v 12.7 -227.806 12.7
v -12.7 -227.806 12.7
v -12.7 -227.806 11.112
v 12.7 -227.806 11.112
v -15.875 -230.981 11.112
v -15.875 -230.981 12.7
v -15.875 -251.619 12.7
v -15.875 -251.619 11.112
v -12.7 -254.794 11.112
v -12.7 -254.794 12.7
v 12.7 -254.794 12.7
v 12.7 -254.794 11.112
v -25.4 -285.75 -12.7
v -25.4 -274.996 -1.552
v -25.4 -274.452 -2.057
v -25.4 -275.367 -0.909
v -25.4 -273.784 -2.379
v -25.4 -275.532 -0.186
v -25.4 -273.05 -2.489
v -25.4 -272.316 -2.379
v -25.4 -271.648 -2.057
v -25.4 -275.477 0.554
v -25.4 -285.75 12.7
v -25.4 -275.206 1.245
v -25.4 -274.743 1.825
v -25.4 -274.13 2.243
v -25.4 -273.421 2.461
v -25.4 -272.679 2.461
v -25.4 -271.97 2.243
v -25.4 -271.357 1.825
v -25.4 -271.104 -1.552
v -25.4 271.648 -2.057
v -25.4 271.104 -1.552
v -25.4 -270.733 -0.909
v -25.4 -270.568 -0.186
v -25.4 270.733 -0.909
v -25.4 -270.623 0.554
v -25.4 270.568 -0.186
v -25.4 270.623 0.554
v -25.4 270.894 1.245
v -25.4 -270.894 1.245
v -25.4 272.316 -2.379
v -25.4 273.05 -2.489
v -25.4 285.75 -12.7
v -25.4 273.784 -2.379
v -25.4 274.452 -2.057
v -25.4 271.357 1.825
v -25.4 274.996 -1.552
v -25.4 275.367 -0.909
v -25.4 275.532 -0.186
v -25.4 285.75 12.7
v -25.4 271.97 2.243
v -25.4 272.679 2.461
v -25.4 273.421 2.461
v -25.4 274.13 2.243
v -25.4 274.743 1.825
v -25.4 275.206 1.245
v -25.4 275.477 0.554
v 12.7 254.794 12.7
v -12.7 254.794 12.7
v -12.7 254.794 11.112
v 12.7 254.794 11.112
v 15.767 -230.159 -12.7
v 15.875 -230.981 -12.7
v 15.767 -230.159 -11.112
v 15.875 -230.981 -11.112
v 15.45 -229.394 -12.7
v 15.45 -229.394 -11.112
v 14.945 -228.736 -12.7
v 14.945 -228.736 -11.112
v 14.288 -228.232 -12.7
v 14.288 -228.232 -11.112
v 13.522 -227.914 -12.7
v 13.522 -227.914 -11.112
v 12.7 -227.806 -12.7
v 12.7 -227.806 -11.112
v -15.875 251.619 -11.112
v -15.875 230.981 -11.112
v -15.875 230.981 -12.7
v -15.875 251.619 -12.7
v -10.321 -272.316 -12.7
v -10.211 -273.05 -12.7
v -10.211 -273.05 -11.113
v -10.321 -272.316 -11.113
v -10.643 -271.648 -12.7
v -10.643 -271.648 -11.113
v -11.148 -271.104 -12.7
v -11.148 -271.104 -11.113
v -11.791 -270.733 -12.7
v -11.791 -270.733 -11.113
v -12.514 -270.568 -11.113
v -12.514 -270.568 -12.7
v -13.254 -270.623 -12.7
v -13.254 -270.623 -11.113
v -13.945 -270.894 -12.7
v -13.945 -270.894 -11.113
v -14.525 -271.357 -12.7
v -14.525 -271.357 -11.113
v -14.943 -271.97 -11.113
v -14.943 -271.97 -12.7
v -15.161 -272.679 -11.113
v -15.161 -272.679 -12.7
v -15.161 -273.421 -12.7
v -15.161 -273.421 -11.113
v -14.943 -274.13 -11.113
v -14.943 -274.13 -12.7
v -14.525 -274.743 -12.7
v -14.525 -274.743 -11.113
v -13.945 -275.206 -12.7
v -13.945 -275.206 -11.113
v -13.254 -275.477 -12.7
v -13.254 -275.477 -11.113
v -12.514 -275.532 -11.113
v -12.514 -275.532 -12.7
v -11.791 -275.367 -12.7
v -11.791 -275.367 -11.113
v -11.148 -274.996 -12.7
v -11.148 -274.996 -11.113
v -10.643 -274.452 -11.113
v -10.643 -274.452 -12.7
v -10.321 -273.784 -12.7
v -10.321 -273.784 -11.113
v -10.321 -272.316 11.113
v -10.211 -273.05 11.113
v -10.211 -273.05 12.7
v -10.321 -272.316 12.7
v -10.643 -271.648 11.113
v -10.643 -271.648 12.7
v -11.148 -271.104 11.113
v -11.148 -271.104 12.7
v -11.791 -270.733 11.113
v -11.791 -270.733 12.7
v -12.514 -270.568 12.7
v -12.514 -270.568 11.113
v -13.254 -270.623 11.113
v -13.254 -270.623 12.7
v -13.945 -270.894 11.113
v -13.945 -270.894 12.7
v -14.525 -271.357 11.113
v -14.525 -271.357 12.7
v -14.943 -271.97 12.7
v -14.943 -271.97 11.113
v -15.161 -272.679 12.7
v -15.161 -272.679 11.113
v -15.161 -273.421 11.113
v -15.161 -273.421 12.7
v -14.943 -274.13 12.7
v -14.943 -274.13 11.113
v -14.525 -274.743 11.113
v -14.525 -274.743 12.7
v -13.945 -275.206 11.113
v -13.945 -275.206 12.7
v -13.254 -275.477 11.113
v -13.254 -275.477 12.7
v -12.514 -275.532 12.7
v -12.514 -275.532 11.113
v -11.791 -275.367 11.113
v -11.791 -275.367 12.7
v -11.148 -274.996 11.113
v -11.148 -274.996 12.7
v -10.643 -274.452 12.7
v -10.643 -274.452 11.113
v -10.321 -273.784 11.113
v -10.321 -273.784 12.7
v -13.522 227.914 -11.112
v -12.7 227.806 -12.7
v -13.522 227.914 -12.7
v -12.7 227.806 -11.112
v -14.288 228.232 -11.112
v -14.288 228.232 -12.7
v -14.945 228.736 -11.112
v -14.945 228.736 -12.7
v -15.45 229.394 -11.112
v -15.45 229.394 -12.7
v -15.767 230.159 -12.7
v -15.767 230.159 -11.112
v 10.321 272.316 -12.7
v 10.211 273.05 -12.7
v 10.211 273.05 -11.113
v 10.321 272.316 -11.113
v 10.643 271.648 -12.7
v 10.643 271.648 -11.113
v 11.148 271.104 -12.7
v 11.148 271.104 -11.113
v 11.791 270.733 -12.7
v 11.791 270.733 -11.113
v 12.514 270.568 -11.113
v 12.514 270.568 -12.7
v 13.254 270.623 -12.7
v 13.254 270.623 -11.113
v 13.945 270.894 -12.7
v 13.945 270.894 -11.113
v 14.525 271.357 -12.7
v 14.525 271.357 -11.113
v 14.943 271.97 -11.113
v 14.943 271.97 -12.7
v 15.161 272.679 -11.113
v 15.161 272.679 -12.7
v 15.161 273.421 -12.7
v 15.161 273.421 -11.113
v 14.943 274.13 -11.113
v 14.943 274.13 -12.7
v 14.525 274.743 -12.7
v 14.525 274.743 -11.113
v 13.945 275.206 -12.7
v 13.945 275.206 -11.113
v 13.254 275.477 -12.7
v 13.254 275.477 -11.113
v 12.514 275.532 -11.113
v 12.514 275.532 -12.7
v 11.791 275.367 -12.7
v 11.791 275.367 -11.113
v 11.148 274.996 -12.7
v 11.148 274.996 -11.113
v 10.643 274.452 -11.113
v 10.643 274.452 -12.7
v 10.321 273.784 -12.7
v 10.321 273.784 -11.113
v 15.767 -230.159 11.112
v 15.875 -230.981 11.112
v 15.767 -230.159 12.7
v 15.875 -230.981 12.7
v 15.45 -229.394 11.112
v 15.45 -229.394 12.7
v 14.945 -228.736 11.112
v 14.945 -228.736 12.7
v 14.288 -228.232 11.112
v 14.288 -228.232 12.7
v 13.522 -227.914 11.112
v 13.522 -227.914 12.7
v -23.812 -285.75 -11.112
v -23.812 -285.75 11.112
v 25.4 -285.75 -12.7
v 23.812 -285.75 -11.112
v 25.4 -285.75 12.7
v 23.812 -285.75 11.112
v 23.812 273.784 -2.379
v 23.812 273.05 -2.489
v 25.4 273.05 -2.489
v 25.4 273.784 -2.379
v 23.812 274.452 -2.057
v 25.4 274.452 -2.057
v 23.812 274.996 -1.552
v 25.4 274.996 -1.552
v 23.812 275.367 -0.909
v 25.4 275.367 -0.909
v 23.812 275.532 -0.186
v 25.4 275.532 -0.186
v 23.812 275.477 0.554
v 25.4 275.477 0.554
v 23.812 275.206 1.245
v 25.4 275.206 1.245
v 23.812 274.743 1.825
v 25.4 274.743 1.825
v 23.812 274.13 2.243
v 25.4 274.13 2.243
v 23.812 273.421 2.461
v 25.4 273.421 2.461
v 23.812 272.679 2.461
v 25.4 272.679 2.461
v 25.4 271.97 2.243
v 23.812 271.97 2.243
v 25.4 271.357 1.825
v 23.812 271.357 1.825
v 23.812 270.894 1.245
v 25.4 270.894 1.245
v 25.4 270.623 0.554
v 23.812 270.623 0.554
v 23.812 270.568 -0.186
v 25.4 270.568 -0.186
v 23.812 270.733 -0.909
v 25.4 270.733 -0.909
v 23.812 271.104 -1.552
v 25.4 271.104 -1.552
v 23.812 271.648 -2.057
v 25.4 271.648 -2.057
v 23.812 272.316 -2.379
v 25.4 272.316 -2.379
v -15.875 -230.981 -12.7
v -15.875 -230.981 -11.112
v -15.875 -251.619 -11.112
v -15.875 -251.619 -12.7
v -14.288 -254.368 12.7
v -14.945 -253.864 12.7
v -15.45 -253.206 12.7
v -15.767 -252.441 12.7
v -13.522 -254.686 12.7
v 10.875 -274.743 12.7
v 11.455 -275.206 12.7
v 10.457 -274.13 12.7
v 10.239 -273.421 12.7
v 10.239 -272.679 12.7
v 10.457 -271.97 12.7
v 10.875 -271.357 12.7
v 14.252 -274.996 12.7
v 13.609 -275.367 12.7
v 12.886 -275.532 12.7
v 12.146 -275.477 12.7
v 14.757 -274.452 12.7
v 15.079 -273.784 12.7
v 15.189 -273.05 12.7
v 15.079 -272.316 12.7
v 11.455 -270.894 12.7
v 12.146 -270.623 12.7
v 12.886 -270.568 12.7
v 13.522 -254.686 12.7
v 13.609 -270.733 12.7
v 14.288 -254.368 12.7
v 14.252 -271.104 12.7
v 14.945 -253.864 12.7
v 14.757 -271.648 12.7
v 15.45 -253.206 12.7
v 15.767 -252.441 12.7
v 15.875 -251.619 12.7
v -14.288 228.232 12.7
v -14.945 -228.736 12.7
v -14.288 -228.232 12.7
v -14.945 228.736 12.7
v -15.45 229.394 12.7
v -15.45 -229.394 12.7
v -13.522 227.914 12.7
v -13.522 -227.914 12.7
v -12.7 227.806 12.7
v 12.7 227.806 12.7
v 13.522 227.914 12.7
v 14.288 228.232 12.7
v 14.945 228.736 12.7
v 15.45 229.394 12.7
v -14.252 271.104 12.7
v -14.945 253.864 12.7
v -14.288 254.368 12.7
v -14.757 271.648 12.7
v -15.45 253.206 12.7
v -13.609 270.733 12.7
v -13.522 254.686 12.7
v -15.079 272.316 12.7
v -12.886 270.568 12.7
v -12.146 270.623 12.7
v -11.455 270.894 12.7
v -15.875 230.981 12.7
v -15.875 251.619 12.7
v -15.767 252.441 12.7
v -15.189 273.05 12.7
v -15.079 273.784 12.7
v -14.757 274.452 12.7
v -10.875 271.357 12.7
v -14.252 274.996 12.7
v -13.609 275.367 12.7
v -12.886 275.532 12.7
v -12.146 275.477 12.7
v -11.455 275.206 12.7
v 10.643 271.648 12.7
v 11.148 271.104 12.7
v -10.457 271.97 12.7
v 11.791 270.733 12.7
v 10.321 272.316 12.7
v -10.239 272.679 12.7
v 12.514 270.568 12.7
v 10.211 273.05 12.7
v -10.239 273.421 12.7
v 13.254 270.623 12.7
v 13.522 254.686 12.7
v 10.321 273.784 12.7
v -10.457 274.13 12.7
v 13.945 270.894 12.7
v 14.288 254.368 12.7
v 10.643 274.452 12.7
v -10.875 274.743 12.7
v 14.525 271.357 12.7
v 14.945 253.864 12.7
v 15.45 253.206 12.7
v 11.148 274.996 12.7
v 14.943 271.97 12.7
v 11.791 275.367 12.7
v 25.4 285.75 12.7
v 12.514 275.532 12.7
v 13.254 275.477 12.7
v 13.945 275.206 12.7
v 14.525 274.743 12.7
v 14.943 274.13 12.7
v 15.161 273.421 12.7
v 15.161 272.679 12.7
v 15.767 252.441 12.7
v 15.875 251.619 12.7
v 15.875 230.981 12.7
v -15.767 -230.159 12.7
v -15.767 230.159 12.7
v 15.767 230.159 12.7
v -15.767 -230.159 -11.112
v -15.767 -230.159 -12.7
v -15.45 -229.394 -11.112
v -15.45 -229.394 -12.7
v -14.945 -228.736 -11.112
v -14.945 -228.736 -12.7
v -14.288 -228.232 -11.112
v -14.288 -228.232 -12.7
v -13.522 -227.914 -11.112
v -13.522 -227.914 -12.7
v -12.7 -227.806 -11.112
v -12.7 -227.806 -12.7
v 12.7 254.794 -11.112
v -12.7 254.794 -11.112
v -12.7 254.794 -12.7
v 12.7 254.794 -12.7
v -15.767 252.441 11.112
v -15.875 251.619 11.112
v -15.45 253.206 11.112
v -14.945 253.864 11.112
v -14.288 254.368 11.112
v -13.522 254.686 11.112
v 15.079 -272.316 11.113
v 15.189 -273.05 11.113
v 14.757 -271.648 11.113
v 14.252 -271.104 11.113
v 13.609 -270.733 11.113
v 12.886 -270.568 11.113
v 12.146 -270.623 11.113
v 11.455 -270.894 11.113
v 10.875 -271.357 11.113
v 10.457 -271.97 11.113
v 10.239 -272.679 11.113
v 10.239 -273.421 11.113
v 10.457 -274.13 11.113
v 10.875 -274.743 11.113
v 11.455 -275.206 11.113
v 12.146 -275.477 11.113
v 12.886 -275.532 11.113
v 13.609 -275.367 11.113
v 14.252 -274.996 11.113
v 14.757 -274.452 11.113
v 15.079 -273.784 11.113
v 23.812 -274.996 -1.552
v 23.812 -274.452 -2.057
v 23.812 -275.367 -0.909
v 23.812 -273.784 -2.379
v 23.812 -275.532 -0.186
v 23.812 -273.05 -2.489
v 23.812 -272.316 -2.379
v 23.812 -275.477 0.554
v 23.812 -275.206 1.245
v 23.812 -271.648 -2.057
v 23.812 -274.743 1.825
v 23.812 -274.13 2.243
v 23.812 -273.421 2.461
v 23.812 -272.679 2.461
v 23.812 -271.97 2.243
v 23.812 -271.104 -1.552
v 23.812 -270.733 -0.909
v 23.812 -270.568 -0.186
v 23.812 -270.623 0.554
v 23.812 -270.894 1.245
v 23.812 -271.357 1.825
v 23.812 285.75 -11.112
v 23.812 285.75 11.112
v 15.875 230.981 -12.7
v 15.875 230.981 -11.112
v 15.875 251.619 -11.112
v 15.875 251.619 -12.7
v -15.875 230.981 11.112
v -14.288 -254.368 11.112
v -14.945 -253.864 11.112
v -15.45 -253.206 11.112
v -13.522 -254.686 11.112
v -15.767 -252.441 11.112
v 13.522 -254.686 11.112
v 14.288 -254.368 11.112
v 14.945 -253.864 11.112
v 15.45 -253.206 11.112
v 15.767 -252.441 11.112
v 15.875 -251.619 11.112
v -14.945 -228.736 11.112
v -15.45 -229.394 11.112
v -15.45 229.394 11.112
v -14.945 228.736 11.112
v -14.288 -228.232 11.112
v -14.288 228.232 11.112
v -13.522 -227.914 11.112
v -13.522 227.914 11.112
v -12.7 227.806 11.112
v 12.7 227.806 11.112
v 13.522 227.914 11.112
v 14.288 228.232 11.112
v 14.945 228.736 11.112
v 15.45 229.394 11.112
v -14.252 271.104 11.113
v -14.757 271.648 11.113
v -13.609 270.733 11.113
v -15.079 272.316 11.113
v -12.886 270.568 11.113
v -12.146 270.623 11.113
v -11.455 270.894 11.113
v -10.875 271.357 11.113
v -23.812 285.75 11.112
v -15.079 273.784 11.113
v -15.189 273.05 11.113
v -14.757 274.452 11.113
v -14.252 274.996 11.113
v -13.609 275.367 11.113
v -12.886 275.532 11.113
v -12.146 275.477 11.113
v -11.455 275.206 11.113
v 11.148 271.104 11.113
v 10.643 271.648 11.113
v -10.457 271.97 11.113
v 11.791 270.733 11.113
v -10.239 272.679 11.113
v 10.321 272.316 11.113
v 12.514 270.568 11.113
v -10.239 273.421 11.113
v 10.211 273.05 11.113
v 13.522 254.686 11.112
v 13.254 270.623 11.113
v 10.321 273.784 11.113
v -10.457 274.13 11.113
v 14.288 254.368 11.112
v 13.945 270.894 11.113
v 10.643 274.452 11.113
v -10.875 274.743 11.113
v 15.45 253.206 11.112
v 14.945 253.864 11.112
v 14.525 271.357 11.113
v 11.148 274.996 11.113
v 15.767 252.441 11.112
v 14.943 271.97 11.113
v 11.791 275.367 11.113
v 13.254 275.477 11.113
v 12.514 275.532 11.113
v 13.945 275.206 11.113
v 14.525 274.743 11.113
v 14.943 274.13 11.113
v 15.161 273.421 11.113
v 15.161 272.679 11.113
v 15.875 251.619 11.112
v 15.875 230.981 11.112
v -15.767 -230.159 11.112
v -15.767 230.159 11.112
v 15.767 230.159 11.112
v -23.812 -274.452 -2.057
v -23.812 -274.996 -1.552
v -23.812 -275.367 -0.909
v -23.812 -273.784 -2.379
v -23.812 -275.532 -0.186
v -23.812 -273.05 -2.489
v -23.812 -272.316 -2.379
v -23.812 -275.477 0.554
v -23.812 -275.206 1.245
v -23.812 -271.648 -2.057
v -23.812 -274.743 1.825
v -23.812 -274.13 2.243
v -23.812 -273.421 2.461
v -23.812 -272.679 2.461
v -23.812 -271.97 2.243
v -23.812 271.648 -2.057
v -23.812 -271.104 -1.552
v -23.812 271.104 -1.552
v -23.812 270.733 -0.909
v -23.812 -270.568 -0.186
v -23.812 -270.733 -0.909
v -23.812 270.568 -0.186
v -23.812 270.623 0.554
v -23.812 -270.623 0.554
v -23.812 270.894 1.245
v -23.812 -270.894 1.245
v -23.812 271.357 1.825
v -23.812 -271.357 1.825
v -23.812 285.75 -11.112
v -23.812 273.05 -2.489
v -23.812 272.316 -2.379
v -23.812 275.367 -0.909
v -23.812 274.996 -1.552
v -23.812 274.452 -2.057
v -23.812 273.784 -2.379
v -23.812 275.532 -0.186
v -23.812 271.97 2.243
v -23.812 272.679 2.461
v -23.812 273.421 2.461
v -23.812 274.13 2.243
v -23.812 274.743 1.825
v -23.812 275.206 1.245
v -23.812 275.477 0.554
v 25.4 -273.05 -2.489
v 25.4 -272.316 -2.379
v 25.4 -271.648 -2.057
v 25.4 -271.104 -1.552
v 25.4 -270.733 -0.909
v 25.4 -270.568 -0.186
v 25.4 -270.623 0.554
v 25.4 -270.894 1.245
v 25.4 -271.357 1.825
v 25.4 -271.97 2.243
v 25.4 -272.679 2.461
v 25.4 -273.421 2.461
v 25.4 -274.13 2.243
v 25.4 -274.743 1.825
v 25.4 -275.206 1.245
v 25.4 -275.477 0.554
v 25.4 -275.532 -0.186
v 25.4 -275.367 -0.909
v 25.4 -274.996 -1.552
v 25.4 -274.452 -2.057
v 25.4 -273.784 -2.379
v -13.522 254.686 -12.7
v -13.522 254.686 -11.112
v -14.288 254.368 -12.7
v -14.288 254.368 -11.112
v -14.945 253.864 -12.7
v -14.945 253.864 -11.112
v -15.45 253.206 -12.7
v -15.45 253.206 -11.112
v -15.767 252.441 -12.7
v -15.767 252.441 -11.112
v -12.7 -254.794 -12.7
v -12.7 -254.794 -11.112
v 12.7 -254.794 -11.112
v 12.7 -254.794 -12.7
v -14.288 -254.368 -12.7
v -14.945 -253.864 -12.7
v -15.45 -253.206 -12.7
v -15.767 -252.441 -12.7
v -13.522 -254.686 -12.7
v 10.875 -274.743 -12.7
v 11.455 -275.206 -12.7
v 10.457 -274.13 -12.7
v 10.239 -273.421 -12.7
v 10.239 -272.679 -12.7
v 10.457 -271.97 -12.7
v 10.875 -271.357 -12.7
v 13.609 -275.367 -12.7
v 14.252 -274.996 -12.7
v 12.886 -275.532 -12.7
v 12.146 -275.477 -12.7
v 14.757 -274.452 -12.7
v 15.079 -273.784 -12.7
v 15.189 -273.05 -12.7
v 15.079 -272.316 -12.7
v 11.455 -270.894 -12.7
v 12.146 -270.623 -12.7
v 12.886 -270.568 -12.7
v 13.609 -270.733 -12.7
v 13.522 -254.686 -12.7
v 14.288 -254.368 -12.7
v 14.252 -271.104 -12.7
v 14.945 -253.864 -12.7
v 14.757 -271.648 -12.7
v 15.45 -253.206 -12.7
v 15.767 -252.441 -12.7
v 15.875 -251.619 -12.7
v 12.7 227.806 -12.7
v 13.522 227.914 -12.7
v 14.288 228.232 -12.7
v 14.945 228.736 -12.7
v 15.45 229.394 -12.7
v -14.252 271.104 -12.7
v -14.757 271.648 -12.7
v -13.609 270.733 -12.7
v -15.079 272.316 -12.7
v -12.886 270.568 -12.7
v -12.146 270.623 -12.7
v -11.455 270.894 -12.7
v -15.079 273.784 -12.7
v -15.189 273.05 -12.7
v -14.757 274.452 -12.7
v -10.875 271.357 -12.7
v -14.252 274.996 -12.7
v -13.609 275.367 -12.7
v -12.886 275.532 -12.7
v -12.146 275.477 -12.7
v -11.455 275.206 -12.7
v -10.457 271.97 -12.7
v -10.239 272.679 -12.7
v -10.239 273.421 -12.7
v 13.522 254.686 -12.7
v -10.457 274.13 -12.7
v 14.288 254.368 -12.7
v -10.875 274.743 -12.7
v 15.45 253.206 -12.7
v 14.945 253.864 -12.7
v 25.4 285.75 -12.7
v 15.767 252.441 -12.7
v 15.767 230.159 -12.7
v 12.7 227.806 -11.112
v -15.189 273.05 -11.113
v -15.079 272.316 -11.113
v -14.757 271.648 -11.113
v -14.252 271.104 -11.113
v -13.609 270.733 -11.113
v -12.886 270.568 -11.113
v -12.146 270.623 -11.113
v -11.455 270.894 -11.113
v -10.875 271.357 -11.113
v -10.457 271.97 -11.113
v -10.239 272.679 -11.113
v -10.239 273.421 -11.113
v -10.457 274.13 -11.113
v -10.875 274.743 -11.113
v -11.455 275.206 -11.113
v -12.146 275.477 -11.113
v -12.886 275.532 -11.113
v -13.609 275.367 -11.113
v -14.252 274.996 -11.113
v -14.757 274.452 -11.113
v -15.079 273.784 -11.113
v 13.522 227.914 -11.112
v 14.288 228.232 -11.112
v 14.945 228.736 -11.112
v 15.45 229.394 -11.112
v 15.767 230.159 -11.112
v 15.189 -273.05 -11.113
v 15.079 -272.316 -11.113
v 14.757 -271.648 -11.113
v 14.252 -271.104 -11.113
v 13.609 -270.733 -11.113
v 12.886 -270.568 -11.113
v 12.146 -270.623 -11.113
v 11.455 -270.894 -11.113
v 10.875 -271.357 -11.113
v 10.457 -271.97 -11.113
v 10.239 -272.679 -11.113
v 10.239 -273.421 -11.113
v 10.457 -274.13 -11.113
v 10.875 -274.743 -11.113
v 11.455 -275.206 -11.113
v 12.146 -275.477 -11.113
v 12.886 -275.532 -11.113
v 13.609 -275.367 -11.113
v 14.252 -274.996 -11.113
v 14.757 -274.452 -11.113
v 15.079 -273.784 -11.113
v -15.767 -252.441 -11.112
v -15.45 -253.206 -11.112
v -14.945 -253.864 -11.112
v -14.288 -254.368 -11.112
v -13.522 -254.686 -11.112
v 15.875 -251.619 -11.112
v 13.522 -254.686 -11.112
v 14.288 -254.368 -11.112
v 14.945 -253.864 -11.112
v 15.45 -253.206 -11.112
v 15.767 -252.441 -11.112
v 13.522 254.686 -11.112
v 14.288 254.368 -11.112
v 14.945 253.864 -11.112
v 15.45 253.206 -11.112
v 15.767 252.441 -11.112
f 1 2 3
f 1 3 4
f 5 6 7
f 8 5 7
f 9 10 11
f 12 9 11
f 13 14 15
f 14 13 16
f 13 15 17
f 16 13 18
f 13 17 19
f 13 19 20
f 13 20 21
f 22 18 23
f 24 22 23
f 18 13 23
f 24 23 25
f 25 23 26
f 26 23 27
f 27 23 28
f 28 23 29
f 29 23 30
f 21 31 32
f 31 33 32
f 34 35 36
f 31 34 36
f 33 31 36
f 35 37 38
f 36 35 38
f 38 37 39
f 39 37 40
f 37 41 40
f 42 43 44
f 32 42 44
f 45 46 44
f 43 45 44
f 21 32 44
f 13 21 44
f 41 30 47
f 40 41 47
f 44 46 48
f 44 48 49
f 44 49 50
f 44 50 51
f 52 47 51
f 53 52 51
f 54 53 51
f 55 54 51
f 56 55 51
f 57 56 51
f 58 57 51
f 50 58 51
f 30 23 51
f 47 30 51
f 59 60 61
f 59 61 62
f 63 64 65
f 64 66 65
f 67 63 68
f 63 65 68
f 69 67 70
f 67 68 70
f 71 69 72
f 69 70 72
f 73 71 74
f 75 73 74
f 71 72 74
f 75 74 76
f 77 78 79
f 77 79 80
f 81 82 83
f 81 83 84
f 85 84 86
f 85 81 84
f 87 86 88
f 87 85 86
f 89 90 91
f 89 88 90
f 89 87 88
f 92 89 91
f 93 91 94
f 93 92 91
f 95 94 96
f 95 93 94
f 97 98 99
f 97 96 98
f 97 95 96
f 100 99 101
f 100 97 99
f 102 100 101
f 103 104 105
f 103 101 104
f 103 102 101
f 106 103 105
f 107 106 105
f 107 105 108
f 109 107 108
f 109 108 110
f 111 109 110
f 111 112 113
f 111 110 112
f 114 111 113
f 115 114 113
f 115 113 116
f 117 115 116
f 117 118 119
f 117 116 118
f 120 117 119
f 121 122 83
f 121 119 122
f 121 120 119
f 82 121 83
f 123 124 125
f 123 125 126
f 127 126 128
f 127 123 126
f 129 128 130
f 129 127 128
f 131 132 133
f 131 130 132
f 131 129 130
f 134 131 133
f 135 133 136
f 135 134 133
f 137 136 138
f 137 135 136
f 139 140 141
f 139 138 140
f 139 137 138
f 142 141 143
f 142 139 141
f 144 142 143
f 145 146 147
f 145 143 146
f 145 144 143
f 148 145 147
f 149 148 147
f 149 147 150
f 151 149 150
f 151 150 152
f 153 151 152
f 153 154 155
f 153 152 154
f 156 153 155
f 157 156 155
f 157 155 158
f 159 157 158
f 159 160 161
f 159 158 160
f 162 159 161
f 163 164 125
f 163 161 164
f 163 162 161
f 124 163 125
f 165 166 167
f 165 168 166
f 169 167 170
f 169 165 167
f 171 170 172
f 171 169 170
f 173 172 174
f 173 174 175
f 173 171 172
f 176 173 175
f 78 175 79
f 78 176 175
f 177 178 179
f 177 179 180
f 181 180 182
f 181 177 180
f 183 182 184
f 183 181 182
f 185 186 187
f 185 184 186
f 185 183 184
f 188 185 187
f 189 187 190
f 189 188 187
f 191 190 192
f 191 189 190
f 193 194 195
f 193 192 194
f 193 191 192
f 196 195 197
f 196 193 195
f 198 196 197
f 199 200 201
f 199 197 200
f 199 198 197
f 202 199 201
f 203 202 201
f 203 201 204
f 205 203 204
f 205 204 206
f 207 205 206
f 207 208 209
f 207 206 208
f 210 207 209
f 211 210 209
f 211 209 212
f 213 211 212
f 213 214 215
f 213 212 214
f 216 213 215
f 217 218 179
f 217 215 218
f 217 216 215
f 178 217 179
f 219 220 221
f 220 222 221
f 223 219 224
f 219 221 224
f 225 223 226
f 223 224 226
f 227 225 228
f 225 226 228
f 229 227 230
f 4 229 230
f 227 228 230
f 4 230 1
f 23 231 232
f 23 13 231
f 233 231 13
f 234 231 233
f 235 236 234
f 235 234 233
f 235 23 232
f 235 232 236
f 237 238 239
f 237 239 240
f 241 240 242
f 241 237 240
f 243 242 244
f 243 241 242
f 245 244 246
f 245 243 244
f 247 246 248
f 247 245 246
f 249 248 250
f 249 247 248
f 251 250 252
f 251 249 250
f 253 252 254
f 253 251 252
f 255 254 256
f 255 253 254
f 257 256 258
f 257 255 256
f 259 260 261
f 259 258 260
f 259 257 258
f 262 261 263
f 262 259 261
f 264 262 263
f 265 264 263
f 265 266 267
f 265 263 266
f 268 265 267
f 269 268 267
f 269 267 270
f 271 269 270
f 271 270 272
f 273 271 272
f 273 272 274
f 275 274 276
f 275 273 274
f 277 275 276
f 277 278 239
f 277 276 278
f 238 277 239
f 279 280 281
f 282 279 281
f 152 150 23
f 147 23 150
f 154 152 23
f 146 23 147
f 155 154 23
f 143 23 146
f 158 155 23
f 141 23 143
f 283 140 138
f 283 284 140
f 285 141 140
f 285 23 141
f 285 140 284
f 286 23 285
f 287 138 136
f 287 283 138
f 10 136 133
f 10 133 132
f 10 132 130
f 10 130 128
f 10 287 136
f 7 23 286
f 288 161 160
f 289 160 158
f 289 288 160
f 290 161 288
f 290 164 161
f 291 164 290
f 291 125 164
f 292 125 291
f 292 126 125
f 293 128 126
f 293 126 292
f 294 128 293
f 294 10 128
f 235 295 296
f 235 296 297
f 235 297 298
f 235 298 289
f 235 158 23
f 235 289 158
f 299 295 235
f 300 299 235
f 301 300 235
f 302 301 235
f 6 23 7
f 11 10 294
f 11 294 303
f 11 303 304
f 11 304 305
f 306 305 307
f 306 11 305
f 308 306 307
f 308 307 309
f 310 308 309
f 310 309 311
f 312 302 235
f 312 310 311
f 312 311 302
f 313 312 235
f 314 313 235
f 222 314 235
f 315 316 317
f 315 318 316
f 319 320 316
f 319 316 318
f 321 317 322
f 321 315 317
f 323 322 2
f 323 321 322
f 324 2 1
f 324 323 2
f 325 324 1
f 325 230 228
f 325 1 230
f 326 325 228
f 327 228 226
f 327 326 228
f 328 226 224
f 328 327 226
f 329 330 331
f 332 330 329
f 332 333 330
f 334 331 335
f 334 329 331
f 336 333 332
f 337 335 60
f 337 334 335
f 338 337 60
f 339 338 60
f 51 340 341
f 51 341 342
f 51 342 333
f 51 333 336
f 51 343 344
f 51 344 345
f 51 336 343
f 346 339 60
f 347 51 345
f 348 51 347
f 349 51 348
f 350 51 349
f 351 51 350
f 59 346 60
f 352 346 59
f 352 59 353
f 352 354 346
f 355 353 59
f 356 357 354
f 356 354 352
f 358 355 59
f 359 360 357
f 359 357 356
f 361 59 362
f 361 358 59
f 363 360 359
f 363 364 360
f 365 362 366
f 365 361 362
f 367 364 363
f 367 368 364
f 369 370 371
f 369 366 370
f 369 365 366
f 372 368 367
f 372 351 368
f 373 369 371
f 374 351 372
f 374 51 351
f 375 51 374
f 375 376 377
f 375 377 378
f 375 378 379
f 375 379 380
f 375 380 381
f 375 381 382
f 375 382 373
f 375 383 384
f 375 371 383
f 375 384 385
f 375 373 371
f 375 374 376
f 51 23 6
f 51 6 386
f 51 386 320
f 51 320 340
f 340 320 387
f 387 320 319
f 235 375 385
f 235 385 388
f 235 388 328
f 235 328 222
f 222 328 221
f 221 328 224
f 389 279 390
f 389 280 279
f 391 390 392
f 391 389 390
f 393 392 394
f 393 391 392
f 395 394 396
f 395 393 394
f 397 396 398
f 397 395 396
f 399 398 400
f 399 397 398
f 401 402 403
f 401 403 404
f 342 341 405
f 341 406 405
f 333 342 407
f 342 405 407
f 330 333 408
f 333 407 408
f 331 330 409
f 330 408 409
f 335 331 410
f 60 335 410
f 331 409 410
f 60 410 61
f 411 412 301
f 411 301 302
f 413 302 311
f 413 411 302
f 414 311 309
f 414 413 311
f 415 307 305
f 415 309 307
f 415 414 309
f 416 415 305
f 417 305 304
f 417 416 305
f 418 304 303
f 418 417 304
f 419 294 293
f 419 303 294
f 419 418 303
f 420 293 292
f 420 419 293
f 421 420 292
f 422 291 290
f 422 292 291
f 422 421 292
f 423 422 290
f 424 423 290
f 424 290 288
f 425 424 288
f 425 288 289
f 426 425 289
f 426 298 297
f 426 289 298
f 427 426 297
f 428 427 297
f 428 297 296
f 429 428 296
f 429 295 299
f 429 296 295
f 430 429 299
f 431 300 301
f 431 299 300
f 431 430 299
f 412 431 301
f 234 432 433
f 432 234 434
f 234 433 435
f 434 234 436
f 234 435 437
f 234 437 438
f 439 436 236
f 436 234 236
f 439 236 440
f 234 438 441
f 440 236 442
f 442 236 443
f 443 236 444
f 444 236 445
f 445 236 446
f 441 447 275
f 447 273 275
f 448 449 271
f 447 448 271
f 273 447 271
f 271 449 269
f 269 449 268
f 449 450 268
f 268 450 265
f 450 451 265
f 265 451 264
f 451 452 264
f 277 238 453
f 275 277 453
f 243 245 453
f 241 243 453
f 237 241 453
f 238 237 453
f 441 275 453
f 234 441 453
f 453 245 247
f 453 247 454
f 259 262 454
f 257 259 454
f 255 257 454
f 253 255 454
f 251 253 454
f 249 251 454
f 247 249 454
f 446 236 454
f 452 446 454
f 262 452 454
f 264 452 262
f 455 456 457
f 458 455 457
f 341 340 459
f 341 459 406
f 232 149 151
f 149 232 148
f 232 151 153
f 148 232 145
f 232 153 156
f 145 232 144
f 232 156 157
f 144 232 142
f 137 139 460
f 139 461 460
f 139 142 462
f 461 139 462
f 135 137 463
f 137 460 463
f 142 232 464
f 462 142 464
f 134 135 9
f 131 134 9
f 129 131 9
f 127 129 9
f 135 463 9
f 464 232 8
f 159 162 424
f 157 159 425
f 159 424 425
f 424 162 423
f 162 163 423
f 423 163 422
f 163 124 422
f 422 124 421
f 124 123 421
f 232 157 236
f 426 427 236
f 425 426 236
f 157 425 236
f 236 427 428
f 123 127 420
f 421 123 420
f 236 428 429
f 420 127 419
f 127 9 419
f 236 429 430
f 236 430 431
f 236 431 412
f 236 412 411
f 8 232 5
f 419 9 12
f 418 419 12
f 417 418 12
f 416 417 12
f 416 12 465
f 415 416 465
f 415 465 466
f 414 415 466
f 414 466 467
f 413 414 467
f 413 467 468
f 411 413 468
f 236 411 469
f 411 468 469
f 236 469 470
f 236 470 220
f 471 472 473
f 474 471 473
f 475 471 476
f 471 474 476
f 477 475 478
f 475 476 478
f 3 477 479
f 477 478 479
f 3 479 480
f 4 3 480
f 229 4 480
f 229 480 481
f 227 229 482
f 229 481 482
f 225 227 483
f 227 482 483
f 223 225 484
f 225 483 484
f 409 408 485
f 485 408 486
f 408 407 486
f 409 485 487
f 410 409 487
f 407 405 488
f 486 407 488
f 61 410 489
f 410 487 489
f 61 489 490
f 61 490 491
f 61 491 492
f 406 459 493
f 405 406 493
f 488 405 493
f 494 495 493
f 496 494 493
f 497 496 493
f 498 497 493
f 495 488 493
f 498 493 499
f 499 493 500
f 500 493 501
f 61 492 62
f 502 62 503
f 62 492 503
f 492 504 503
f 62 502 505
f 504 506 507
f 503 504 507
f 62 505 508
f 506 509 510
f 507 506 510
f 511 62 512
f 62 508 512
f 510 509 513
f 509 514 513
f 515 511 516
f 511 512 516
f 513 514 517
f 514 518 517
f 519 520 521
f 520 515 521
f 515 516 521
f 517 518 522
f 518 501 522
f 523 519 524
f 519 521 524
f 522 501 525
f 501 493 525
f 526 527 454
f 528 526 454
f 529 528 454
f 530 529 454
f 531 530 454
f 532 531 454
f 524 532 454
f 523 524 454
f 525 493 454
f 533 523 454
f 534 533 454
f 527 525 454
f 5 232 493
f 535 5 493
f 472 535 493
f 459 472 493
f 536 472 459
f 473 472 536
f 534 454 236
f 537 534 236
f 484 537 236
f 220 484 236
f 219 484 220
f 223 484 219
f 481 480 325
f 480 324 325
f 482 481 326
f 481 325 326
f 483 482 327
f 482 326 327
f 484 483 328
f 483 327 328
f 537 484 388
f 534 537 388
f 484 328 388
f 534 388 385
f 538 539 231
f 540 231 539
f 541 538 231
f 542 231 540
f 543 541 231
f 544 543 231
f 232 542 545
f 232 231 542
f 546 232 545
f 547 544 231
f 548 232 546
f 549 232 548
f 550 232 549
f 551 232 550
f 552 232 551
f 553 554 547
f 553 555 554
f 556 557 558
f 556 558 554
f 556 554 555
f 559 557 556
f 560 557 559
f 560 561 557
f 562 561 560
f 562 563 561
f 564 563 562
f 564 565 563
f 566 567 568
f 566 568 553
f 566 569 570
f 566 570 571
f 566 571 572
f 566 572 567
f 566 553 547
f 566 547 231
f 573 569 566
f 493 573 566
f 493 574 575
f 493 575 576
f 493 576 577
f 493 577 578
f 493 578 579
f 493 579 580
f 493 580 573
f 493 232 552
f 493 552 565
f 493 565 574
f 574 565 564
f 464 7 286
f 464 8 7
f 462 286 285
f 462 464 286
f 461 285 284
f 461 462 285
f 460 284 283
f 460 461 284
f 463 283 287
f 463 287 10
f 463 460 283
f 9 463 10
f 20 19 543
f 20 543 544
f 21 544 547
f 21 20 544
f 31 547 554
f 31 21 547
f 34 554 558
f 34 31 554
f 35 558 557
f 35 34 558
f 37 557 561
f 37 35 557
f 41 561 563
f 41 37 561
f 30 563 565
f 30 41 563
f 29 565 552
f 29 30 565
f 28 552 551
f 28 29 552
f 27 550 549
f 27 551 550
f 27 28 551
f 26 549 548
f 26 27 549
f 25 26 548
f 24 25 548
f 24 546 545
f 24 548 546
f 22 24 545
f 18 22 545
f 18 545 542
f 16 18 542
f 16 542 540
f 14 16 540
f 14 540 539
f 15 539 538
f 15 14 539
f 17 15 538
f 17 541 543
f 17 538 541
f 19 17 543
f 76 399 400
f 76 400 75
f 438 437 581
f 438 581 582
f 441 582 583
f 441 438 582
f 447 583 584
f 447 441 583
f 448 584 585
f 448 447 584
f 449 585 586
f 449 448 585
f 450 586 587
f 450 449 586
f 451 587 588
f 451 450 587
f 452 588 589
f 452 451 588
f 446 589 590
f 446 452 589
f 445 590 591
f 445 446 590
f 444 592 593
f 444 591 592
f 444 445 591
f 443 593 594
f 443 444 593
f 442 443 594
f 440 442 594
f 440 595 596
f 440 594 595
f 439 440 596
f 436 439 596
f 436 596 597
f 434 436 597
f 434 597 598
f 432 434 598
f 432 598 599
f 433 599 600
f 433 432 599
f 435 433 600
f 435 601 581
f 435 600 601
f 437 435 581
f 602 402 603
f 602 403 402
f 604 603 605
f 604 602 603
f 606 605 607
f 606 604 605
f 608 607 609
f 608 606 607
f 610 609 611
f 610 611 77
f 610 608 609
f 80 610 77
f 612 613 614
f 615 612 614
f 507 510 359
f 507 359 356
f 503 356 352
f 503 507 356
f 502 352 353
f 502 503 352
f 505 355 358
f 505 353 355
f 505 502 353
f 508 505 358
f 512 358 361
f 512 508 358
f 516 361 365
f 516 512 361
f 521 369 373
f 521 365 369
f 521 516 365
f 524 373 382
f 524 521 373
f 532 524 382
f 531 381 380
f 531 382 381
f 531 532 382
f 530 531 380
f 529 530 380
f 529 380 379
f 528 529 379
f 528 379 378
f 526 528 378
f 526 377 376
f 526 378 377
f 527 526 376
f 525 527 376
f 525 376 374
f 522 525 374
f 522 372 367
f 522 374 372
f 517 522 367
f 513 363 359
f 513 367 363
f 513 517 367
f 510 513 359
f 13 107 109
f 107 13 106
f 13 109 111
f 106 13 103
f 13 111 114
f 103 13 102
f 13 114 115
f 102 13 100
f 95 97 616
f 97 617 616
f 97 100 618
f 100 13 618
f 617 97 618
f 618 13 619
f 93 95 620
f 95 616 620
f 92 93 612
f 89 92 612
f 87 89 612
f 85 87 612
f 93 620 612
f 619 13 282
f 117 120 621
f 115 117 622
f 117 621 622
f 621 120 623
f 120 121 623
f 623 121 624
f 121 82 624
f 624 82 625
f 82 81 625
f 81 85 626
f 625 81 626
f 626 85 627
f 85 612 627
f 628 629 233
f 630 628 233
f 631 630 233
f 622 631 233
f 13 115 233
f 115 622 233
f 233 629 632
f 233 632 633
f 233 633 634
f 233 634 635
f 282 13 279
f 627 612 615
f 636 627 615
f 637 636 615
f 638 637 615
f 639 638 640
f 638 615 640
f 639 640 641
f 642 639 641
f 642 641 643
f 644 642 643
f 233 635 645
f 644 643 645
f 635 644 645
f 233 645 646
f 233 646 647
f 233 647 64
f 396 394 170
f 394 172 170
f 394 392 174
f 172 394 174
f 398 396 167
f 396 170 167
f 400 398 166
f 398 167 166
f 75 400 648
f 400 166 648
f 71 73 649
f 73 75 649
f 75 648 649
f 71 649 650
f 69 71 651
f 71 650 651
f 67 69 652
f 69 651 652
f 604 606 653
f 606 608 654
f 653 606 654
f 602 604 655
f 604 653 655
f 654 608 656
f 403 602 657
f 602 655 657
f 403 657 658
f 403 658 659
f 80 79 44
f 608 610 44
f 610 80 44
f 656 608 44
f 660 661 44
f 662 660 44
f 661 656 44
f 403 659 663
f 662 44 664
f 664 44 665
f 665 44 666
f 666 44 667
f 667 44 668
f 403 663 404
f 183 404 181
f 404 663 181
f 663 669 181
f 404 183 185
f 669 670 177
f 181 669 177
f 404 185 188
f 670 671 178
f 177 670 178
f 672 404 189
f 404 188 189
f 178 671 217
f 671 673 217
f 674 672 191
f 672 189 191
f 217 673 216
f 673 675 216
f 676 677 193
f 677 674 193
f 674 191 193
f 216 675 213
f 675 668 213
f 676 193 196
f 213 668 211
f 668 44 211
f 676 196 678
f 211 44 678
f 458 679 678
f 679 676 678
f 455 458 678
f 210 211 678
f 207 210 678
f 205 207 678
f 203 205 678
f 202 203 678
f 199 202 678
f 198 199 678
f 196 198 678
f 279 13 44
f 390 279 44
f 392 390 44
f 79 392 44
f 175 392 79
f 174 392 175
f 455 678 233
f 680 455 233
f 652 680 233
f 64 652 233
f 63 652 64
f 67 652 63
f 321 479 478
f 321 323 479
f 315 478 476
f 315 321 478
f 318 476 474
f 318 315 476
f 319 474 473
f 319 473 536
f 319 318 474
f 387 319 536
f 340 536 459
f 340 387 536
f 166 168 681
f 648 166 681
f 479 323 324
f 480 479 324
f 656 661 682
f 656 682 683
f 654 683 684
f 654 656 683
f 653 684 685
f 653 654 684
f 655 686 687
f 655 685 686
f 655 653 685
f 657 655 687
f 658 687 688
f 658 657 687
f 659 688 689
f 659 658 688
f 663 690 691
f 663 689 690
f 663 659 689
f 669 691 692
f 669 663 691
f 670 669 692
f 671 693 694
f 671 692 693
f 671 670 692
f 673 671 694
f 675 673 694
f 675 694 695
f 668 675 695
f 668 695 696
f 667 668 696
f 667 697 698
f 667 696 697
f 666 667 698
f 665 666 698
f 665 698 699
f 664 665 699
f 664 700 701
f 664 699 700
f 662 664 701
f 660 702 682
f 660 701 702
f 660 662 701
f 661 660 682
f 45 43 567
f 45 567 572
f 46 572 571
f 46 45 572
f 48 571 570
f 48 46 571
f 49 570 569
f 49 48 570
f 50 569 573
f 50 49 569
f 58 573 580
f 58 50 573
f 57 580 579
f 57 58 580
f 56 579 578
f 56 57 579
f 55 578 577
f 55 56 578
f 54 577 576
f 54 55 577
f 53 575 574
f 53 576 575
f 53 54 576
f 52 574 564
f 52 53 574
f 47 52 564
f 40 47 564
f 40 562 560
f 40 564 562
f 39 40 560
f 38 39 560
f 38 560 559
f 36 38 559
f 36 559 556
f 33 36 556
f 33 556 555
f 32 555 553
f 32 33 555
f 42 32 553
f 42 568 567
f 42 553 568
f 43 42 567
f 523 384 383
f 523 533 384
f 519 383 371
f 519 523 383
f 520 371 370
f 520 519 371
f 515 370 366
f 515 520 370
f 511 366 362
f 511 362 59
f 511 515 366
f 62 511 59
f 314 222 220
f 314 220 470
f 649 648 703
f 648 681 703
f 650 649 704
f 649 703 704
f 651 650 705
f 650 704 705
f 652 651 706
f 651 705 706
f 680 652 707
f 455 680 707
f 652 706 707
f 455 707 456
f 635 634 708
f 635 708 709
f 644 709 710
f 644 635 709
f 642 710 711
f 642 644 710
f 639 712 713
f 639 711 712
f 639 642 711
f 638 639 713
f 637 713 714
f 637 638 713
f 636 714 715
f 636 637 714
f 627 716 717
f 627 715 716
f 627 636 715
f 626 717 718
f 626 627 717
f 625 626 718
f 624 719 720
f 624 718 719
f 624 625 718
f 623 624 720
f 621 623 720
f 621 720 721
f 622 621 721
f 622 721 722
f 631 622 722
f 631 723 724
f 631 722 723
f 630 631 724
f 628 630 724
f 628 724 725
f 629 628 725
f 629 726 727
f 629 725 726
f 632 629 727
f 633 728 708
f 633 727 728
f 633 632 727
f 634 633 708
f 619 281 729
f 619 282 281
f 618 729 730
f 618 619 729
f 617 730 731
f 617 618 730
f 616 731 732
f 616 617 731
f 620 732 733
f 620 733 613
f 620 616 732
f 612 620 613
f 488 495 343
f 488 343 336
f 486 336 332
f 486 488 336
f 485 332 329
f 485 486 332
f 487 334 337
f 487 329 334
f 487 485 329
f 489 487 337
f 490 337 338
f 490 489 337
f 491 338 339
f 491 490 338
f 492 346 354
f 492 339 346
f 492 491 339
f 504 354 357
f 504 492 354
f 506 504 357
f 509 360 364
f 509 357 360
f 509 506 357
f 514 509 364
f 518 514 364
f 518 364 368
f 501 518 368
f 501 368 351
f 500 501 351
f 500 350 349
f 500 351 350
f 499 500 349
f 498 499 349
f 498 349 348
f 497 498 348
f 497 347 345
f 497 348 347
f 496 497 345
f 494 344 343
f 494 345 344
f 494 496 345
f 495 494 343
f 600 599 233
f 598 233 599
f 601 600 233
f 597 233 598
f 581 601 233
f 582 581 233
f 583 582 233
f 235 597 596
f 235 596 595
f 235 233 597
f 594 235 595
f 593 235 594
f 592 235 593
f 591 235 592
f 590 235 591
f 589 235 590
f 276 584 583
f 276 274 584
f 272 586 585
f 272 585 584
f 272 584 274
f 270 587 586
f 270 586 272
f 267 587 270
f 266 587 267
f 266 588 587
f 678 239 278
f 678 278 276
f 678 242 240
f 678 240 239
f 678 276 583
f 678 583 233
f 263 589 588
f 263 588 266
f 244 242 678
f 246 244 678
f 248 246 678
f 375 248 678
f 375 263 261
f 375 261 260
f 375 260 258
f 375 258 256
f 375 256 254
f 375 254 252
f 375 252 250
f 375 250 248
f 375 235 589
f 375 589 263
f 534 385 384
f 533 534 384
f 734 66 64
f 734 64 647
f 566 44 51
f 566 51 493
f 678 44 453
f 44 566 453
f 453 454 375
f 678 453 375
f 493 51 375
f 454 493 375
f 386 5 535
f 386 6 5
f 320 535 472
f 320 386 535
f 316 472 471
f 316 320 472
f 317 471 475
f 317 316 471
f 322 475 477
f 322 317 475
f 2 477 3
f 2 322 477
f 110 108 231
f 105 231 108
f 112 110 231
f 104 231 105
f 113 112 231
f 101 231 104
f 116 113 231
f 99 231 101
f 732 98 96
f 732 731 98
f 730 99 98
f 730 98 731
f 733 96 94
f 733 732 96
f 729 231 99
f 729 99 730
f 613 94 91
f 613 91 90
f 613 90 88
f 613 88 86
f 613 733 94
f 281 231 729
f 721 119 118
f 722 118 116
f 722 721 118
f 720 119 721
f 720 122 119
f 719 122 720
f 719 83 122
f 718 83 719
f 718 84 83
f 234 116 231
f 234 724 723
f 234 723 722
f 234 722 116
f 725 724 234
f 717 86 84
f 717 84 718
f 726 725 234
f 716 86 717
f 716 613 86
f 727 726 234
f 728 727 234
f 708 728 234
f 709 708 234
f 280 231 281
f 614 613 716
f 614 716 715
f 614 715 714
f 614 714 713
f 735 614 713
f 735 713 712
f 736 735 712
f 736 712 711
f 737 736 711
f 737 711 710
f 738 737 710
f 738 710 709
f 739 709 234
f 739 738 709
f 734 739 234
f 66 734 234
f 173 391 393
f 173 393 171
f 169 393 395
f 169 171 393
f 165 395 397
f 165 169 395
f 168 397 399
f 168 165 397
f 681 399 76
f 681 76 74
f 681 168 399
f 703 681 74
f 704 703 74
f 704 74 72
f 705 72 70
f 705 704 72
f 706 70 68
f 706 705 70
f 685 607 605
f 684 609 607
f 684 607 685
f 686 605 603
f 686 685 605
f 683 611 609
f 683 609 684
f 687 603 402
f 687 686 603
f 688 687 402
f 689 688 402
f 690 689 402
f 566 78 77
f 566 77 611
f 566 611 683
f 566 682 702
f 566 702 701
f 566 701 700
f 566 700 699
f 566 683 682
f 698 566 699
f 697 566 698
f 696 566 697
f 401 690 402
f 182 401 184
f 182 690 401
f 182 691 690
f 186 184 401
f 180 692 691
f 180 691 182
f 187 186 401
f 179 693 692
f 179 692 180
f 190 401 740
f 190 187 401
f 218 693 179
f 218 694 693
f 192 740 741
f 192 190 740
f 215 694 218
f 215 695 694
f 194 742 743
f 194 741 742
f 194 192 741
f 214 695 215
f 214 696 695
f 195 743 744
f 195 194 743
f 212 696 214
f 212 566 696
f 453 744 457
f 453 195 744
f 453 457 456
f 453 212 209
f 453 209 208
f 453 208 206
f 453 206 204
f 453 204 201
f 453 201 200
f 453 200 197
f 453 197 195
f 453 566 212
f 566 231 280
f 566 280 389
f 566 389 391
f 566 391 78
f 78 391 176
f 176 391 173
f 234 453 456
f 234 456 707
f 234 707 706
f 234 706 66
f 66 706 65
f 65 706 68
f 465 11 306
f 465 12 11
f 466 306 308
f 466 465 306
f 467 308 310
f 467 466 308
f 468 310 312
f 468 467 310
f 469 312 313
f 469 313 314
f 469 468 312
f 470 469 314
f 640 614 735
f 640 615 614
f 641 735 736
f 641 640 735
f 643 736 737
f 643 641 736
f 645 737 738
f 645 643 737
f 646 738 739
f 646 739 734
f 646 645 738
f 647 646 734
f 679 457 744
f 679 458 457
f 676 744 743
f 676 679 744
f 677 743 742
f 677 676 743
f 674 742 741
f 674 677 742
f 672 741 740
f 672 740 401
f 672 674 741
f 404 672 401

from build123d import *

# Parameters (mm, degrees)
SKETCH1_W               = 50.8
SKETCH1_H               = 571.5
BOSS_EXTRUDE1_DEPTH     = 12.7
SHELL1_T                = -1.5875
CUT_EXTRUDE1_DEPTH      = 288.157643987
CUT_EXTRUDE1_DEPTH_BACK = 288.157643987
SKETCH2_R               = 2.4892
CUT_EXTRUDE2_DEPTH      = 288.157643987
CUT_EXTRUDE2_DEPTH_BACK = 288.157643987
SKETCH3_R               = 2.4892
SKETCH4_W               = 31.75
SKETCH4_H               = 26.9875
CUT_EXTRUDE3_DEPTH      = 288.157643987
FILLET1_R               = 3.175
FILLET1_OF_MIRROR1_R    = 3.175
FILLET2_R               = 3.175


with BuildPart() as part:
    # Sketch1 → Boss-Extrude1 (new, symmetric)
    with BuildSketch(Plane.XY):
        Rectangle(SKETCH1_W, SKETCH1_H)
    extrude(amount=BOSS_EXTRUDE1_DEPTH, both=True)

    # Shell1
    shell1_openings = [part.faces().sort_by_distance(p)[0] for p in [
        (0, -285.75, 0),
        (0, 285.75, 0),
    ]]
    offset(amount=SHELL1_T, openings=shell1_openings, kind=Kind.INTERSECTION)

    # Sketch2 → Cut-Extrude1 (cut, two sides: drawn at the far end of the back side and taken through both)
    with BuildSketch(Plane.XY.offset(-CUT_EXTRUDE1_DEPTH_BACK)):
        with Locations((-12.7, -273.05)):
            Circle(SKETCH2_R)
        with Locations((12.7, -273.05)):
            Circle(SKETCH2_R)
        with Locations(Location((12.7, 273.05, 0), (0, 0, 180))):
            Circle(SKETCH2_R)
        with Locations(Location((-12.7, 273.05, 0), (0, 0, 180))):
            Circle(SKETCH2_R)
    extrude(amount=CUT_EXTRUDE1_DEPTH + CUT_EXTRUDE1_DEPTH_BACK, mode=Mode.SUBTRACT)

    # Sketch3 → Cut-Extrude2 (cut, two sides: drawn at the far end of the back side and taken through both)
    with BuildSketch(Plane(origin=(0, 0, 0), x_dir=(0, 0, -1), z_dir=(1, 0, 0)).offset(-CUT_EXTRUDE2_DEPTH_BACK)):
        with Locations((0, -273.05)):
            Circle(SKETCH3_R)
        with Locations((0, 273.05)):
            Circle(SKETCH3_R)
    extrude(amount=CUT_EXTRUDE2_DEPTH + CUT_EXTRUDE2_DEPTH_BACK, mode=Mode.SUBTRACT)

    # Sketch4 → Cut-Extrude3 (cut, symmetric)
    with BuildSketch(Plane.XY):
        with Locations((0, 241.3)):
            Rectangle(SKETCH4_W, SKETCH4_H)
    cut_extrude3 = extrude(amount=CUT_EXTRUDE3_DEPTH, both=True, mode=Mode.SUBTRACT)

    # Fillet1
    fillet1_edges = [part.edges().sort_by_distance(p)[0] for p in [
        (-15.875, 227.80625, -11.90625),
        (-15.875, 254.79375, -11.90625),
        (15.875, 254.79375, -11.90625),
        (15.875, 227.80625, -11.90625),
    ]]
    fillet(fillet1_edges, radius=FILLET1_R)

    # Mirror1: Cut-Extrude3 across plane
    add(cut_extrude3.mirror(Plane.ZX), mode=Mode.SUBTRACT)

    # Fillet1 of Mirror1
    fillet1_of_mirror1_edges = [part.edges().sort_by_distance(p)[0] for p in [
        (-15.875, -227.80625, -11.90625),
        (-15.875, -254.79375, -11.90625),
        (15.875, -254.79375, -11.90625),
        (15.875, -227.80625, -11.90625),
    ]]
    fillet(fillet1_of_mirror1_edges, radius=FILLET1_OF_MIRROR1_R)

    # Fillet2
    fillet2_edges = [part.edges().sort_by_distance(p)[0] for p in [
        (-15.875, -254.79375, 11.90625),
        (-15.875, -227.80625, 11.90625),
        (15.875, -227.80625, 11.90625),
        (15.875, -254.79375, 11.90625),
        (-15.875, 227.80625, 11.90625),
        (-15.875, 254.79375, 11.90625),
        (15.875, 254.79375, 11.90625),
        (15.875, 227.80625, 11.90625),
    ]]
    fillet(fillet2_edges, radius=FILLET2_R)


solid = part.part
